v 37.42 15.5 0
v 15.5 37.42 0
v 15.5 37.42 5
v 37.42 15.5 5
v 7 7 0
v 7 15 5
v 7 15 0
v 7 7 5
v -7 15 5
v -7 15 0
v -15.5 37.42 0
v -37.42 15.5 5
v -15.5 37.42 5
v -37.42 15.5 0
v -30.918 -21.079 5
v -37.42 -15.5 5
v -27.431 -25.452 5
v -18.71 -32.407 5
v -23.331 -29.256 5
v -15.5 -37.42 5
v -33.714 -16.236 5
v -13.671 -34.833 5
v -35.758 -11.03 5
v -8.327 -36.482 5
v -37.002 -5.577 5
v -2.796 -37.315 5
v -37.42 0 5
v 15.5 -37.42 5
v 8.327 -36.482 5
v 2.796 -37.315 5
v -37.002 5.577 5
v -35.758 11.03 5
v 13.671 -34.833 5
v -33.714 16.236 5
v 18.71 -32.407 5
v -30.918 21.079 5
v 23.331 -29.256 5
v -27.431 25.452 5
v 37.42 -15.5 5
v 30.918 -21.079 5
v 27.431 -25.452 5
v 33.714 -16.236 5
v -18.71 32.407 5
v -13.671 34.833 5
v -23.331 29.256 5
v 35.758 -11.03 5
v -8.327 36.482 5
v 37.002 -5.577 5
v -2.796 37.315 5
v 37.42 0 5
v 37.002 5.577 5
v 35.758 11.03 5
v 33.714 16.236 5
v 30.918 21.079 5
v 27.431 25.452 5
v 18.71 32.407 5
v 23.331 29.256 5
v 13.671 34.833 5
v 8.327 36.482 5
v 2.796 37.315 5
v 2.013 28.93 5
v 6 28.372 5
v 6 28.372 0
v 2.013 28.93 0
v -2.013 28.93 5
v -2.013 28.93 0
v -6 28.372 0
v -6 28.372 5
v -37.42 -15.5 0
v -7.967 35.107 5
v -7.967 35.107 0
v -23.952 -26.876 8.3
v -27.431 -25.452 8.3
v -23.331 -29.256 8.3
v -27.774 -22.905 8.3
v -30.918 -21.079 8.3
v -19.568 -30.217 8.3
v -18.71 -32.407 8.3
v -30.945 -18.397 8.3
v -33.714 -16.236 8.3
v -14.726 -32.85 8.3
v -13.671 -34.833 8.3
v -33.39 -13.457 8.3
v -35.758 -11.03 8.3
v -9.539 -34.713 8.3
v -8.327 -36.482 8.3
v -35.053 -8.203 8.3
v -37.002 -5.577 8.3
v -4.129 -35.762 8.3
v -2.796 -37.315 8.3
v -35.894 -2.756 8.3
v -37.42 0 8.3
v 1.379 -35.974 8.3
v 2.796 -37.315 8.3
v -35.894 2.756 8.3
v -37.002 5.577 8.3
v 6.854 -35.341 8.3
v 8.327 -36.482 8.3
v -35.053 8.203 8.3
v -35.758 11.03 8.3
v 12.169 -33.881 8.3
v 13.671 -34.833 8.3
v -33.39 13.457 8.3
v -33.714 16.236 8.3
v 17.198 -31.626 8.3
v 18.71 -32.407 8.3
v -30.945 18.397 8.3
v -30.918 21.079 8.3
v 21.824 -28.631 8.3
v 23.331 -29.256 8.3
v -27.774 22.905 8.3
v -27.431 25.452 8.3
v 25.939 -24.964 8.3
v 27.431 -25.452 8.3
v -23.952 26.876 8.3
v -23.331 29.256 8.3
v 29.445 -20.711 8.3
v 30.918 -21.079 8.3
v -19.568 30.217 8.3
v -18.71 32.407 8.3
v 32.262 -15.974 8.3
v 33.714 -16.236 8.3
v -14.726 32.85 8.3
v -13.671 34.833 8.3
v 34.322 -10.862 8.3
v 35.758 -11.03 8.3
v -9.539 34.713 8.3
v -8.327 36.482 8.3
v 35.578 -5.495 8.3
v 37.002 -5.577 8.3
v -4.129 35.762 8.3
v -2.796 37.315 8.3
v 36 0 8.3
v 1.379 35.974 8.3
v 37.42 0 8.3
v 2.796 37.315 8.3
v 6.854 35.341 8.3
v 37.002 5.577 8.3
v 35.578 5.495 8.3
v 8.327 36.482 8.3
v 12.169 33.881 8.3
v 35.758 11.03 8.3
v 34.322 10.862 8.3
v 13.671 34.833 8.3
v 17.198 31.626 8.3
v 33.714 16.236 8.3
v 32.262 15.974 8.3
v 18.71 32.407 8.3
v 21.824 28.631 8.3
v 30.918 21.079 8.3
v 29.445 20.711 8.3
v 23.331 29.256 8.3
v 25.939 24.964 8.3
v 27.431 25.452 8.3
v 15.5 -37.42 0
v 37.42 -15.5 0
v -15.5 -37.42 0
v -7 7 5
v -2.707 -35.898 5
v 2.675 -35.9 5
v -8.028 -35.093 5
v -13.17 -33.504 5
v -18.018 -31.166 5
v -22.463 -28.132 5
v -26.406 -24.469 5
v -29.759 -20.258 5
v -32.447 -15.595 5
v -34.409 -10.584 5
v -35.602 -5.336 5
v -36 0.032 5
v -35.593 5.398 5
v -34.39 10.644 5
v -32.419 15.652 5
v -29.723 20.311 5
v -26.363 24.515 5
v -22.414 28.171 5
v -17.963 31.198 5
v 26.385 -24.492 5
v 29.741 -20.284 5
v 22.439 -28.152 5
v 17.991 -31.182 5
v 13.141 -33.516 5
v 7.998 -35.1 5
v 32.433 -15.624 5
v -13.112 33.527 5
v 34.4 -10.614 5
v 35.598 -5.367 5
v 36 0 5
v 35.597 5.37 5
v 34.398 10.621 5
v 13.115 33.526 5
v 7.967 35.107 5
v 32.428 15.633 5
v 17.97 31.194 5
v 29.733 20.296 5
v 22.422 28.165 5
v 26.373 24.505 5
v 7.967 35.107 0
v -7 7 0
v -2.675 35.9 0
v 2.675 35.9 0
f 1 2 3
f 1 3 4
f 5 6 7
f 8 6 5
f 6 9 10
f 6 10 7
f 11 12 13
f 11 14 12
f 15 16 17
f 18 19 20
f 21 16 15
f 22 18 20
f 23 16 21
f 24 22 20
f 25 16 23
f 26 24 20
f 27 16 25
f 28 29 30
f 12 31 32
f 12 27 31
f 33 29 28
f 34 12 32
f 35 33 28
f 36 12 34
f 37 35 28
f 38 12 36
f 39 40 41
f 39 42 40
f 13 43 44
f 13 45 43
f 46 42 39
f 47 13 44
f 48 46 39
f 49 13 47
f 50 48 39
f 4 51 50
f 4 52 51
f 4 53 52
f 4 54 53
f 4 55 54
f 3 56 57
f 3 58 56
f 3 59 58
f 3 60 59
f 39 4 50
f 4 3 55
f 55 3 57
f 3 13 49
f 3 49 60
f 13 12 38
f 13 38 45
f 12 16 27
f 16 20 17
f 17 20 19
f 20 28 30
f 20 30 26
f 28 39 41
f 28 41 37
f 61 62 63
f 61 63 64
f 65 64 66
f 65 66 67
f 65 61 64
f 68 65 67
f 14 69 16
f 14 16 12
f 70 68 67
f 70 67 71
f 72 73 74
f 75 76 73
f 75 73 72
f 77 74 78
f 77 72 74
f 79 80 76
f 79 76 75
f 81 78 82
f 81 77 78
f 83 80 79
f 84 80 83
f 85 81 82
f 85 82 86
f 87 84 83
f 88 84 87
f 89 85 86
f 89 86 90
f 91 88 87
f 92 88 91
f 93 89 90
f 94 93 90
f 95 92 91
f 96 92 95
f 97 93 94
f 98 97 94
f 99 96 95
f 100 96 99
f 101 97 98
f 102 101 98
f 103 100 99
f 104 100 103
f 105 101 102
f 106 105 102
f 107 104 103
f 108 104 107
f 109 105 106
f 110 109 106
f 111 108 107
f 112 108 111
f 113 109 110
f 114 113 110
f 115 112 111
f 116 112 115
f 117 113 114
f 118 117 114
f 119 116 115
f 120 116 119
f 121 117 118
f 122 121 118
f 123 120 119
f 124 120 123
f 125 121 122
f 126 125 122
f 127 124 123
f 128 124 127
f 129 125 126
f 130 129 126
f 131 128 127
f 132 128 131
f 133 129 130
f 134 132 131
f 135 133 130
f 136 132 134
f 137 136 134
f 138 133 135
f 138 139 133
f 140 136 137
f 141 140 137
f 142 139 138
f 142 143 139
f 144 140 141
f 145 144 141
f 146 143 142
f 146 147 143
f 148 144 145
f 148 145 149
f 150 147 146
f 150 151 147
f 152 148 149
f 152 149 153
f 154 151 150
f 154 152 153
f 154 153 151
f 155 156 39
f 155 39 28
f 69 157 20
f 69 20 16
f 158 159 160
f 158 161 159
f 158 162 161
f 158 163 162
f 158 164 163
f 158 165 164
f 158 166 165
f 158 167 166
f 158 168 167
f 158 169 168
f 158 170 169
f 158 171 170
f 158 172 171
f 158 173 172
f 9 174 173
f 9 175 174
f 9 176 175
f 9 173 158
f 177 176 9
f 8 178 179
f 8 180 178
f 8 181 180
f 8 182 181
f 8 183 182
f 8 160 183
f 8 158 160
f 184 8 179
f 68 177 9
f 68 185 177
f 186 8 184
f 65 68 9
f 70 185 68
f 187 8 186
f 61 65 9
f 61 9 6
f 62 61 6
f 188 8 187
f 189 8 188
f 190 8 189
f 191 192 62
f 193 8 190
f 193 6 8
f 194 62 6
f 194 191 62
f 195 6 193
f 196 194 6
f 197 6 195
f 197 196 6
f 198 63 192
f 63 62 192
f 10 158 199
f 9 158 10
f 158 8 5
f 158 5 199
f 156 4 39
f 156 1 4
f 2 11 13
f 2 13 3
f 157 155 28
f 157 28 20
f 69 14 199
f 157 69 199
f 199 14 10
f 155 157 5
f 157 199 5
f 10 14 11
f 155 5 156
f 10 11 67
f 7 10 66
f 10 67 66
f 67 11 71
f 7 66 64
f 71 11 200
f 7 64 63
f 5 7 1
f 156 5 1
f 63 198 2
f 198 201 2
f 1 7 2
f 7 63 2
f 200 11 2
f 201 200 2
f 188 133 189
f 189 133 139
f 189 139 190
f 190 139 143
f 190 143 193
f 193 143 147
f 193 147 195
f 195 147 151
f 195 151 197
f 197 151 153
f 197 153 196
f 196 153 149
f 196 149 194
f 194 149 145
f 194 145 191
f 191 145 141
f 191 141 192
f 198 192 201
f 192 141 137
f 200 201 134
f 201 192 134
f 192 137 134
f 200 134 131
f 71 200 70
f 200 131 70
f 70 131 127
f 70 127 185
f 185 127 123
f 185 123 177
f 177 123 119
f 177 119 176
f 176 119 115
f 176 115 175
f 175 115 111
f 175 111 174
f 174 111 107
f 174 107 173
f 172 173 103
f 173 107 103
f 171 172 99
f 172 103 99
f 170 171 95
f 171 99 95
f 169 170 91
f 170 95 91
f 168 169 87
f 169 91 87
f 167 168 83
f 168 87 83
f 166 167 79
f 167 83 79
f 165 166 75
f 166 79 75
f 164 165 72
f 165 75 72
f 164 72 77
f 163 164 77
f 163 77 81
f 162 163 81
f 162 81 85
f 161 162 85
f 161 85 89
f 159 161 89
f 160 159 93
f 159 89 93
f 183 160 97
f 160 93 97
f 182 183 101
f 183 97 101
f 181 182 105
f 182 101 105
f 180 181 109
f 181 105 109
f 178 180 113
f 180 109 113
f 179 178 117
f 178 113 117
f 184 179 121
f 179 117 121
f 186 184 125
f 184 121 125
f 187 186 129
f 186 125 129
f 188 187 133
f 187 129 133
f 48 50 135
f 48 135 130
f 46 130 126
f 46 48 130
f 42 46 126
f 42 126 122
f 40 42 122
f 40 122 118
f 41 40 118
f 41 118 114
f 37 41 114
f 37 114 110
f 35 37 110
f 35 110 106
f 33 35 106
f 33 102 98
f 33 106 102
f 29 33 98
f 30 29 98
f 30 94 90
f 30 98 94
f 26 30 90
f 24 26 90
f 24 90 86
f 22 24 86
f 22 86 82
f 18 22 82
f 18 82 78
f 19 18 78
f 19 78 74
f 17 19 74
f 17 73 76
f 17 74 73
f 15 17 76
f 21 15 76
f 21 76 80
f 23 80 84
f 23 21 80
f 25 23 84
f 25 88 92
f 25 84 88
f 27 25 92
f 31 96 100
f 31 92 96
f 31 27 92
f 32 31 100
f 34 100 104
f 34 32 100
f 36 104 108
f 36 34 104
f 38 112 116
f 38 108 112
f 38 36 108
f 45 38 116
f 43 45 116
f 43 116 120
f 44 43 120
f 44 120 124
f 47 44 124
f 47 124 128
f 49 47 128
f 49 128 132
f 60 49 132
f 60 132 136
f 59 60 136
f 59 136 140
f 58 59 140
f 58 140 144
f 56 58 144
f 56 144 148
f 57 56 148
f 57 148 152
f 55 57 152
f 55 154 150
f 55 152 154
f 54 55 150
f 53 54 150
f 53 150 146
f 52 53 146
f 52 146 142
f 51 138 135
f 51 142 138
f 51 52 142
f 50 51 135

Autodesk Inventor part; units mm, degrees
ref_plane "YZ Plane" through (0, 0, 0) normal (1, 0, 0) x (0, 1, 0)
ref_plane "XZ Plane" through (0, 0, 0) normal (0, 1, 0) x (-1, 0, 0)
ref_plane "XY Plane" through (0, 0, 0) normal (0, 0, 1) x (1, 0, 0)
sketch "Sketch1" plane through (0, 0, 0) normal (0, 0, 1) x (1, 0, 0)
  line L0 (37.4203, -15.5) -> (15.5, -37.4203)
  line L1 (15.5, -37.4203) -> (-15.5, -37.4203)
  line L2 (-15.5, -37.4203) -> (-37.4203, -15.5)
  line L3 (-37.4203, -15.5) -> (-37.4203, 15.5)
  line L4 (-37.4203, 15.5) -> (-15.5, 37.4203)
  line L5 (-15.5, 37.4203) -> (15.5, 37.4203)
  line L6 (15.5, 37.4203) -> (37.4203, 15.5)
  line L7 (37.4203, 15.5) -> (37.4203, -15.5)
  point P0 (0, 0)
  point P1 (0, 0)
  dimension "d0" = 31
  dimension "d1" = 0
extrude "Extrusion3" add sketch "Sketch1" along normal blind 5
sketch "Sketch5" plane through (0, 0, 5) normal (0, 0, 1) x (1, 0, 0)
  circle A0 centre (0, 0) radius 36
  circle A1 centre (0, 0) radius 37.42
  line L0 (-7, 15) -> (7, 15)
  line L1 (7, 15) -> (7, 7)
  line L2 (7, 7) -> (-7, 7)
  line L3 (-7, 7) -> (-7, 15)
  line L4 (0, 29) -> (0, 22) construction
  line L5 (0, 29) -> (7, 29) construction
  circle A2 centre (0, 0) radius 29
  line L6 (-6, 28.3725) -> (-7.9667, 35.1074)
  line L7 (6, 28.3725) -> (7.9667, 35.1074)
  dimension "d14" = 72
  dimension "d15" = 74.84
  dimension "d16" = 14
  dimension "d17" = 8
  dimension "d18" = 7
  dimension "d19" = 15
  dimension "d24" = 29
  dimension "d27" = 6
  dimension "d28" = 0
extrude "Extrusion4" add sketch "Sketch5" along normal blind 3.3 contours A1
extrude "Extrusion5" cut sketch "Sketch5" against normal blind 5 contours L0 L1 L2 L3
extrude "Extrusion6" cut sketch "Sketch5" against normal blind 5 contours L7 A2 L6 A0 picked at (-0.671, 33.577)
properties part number "LEDR03"
